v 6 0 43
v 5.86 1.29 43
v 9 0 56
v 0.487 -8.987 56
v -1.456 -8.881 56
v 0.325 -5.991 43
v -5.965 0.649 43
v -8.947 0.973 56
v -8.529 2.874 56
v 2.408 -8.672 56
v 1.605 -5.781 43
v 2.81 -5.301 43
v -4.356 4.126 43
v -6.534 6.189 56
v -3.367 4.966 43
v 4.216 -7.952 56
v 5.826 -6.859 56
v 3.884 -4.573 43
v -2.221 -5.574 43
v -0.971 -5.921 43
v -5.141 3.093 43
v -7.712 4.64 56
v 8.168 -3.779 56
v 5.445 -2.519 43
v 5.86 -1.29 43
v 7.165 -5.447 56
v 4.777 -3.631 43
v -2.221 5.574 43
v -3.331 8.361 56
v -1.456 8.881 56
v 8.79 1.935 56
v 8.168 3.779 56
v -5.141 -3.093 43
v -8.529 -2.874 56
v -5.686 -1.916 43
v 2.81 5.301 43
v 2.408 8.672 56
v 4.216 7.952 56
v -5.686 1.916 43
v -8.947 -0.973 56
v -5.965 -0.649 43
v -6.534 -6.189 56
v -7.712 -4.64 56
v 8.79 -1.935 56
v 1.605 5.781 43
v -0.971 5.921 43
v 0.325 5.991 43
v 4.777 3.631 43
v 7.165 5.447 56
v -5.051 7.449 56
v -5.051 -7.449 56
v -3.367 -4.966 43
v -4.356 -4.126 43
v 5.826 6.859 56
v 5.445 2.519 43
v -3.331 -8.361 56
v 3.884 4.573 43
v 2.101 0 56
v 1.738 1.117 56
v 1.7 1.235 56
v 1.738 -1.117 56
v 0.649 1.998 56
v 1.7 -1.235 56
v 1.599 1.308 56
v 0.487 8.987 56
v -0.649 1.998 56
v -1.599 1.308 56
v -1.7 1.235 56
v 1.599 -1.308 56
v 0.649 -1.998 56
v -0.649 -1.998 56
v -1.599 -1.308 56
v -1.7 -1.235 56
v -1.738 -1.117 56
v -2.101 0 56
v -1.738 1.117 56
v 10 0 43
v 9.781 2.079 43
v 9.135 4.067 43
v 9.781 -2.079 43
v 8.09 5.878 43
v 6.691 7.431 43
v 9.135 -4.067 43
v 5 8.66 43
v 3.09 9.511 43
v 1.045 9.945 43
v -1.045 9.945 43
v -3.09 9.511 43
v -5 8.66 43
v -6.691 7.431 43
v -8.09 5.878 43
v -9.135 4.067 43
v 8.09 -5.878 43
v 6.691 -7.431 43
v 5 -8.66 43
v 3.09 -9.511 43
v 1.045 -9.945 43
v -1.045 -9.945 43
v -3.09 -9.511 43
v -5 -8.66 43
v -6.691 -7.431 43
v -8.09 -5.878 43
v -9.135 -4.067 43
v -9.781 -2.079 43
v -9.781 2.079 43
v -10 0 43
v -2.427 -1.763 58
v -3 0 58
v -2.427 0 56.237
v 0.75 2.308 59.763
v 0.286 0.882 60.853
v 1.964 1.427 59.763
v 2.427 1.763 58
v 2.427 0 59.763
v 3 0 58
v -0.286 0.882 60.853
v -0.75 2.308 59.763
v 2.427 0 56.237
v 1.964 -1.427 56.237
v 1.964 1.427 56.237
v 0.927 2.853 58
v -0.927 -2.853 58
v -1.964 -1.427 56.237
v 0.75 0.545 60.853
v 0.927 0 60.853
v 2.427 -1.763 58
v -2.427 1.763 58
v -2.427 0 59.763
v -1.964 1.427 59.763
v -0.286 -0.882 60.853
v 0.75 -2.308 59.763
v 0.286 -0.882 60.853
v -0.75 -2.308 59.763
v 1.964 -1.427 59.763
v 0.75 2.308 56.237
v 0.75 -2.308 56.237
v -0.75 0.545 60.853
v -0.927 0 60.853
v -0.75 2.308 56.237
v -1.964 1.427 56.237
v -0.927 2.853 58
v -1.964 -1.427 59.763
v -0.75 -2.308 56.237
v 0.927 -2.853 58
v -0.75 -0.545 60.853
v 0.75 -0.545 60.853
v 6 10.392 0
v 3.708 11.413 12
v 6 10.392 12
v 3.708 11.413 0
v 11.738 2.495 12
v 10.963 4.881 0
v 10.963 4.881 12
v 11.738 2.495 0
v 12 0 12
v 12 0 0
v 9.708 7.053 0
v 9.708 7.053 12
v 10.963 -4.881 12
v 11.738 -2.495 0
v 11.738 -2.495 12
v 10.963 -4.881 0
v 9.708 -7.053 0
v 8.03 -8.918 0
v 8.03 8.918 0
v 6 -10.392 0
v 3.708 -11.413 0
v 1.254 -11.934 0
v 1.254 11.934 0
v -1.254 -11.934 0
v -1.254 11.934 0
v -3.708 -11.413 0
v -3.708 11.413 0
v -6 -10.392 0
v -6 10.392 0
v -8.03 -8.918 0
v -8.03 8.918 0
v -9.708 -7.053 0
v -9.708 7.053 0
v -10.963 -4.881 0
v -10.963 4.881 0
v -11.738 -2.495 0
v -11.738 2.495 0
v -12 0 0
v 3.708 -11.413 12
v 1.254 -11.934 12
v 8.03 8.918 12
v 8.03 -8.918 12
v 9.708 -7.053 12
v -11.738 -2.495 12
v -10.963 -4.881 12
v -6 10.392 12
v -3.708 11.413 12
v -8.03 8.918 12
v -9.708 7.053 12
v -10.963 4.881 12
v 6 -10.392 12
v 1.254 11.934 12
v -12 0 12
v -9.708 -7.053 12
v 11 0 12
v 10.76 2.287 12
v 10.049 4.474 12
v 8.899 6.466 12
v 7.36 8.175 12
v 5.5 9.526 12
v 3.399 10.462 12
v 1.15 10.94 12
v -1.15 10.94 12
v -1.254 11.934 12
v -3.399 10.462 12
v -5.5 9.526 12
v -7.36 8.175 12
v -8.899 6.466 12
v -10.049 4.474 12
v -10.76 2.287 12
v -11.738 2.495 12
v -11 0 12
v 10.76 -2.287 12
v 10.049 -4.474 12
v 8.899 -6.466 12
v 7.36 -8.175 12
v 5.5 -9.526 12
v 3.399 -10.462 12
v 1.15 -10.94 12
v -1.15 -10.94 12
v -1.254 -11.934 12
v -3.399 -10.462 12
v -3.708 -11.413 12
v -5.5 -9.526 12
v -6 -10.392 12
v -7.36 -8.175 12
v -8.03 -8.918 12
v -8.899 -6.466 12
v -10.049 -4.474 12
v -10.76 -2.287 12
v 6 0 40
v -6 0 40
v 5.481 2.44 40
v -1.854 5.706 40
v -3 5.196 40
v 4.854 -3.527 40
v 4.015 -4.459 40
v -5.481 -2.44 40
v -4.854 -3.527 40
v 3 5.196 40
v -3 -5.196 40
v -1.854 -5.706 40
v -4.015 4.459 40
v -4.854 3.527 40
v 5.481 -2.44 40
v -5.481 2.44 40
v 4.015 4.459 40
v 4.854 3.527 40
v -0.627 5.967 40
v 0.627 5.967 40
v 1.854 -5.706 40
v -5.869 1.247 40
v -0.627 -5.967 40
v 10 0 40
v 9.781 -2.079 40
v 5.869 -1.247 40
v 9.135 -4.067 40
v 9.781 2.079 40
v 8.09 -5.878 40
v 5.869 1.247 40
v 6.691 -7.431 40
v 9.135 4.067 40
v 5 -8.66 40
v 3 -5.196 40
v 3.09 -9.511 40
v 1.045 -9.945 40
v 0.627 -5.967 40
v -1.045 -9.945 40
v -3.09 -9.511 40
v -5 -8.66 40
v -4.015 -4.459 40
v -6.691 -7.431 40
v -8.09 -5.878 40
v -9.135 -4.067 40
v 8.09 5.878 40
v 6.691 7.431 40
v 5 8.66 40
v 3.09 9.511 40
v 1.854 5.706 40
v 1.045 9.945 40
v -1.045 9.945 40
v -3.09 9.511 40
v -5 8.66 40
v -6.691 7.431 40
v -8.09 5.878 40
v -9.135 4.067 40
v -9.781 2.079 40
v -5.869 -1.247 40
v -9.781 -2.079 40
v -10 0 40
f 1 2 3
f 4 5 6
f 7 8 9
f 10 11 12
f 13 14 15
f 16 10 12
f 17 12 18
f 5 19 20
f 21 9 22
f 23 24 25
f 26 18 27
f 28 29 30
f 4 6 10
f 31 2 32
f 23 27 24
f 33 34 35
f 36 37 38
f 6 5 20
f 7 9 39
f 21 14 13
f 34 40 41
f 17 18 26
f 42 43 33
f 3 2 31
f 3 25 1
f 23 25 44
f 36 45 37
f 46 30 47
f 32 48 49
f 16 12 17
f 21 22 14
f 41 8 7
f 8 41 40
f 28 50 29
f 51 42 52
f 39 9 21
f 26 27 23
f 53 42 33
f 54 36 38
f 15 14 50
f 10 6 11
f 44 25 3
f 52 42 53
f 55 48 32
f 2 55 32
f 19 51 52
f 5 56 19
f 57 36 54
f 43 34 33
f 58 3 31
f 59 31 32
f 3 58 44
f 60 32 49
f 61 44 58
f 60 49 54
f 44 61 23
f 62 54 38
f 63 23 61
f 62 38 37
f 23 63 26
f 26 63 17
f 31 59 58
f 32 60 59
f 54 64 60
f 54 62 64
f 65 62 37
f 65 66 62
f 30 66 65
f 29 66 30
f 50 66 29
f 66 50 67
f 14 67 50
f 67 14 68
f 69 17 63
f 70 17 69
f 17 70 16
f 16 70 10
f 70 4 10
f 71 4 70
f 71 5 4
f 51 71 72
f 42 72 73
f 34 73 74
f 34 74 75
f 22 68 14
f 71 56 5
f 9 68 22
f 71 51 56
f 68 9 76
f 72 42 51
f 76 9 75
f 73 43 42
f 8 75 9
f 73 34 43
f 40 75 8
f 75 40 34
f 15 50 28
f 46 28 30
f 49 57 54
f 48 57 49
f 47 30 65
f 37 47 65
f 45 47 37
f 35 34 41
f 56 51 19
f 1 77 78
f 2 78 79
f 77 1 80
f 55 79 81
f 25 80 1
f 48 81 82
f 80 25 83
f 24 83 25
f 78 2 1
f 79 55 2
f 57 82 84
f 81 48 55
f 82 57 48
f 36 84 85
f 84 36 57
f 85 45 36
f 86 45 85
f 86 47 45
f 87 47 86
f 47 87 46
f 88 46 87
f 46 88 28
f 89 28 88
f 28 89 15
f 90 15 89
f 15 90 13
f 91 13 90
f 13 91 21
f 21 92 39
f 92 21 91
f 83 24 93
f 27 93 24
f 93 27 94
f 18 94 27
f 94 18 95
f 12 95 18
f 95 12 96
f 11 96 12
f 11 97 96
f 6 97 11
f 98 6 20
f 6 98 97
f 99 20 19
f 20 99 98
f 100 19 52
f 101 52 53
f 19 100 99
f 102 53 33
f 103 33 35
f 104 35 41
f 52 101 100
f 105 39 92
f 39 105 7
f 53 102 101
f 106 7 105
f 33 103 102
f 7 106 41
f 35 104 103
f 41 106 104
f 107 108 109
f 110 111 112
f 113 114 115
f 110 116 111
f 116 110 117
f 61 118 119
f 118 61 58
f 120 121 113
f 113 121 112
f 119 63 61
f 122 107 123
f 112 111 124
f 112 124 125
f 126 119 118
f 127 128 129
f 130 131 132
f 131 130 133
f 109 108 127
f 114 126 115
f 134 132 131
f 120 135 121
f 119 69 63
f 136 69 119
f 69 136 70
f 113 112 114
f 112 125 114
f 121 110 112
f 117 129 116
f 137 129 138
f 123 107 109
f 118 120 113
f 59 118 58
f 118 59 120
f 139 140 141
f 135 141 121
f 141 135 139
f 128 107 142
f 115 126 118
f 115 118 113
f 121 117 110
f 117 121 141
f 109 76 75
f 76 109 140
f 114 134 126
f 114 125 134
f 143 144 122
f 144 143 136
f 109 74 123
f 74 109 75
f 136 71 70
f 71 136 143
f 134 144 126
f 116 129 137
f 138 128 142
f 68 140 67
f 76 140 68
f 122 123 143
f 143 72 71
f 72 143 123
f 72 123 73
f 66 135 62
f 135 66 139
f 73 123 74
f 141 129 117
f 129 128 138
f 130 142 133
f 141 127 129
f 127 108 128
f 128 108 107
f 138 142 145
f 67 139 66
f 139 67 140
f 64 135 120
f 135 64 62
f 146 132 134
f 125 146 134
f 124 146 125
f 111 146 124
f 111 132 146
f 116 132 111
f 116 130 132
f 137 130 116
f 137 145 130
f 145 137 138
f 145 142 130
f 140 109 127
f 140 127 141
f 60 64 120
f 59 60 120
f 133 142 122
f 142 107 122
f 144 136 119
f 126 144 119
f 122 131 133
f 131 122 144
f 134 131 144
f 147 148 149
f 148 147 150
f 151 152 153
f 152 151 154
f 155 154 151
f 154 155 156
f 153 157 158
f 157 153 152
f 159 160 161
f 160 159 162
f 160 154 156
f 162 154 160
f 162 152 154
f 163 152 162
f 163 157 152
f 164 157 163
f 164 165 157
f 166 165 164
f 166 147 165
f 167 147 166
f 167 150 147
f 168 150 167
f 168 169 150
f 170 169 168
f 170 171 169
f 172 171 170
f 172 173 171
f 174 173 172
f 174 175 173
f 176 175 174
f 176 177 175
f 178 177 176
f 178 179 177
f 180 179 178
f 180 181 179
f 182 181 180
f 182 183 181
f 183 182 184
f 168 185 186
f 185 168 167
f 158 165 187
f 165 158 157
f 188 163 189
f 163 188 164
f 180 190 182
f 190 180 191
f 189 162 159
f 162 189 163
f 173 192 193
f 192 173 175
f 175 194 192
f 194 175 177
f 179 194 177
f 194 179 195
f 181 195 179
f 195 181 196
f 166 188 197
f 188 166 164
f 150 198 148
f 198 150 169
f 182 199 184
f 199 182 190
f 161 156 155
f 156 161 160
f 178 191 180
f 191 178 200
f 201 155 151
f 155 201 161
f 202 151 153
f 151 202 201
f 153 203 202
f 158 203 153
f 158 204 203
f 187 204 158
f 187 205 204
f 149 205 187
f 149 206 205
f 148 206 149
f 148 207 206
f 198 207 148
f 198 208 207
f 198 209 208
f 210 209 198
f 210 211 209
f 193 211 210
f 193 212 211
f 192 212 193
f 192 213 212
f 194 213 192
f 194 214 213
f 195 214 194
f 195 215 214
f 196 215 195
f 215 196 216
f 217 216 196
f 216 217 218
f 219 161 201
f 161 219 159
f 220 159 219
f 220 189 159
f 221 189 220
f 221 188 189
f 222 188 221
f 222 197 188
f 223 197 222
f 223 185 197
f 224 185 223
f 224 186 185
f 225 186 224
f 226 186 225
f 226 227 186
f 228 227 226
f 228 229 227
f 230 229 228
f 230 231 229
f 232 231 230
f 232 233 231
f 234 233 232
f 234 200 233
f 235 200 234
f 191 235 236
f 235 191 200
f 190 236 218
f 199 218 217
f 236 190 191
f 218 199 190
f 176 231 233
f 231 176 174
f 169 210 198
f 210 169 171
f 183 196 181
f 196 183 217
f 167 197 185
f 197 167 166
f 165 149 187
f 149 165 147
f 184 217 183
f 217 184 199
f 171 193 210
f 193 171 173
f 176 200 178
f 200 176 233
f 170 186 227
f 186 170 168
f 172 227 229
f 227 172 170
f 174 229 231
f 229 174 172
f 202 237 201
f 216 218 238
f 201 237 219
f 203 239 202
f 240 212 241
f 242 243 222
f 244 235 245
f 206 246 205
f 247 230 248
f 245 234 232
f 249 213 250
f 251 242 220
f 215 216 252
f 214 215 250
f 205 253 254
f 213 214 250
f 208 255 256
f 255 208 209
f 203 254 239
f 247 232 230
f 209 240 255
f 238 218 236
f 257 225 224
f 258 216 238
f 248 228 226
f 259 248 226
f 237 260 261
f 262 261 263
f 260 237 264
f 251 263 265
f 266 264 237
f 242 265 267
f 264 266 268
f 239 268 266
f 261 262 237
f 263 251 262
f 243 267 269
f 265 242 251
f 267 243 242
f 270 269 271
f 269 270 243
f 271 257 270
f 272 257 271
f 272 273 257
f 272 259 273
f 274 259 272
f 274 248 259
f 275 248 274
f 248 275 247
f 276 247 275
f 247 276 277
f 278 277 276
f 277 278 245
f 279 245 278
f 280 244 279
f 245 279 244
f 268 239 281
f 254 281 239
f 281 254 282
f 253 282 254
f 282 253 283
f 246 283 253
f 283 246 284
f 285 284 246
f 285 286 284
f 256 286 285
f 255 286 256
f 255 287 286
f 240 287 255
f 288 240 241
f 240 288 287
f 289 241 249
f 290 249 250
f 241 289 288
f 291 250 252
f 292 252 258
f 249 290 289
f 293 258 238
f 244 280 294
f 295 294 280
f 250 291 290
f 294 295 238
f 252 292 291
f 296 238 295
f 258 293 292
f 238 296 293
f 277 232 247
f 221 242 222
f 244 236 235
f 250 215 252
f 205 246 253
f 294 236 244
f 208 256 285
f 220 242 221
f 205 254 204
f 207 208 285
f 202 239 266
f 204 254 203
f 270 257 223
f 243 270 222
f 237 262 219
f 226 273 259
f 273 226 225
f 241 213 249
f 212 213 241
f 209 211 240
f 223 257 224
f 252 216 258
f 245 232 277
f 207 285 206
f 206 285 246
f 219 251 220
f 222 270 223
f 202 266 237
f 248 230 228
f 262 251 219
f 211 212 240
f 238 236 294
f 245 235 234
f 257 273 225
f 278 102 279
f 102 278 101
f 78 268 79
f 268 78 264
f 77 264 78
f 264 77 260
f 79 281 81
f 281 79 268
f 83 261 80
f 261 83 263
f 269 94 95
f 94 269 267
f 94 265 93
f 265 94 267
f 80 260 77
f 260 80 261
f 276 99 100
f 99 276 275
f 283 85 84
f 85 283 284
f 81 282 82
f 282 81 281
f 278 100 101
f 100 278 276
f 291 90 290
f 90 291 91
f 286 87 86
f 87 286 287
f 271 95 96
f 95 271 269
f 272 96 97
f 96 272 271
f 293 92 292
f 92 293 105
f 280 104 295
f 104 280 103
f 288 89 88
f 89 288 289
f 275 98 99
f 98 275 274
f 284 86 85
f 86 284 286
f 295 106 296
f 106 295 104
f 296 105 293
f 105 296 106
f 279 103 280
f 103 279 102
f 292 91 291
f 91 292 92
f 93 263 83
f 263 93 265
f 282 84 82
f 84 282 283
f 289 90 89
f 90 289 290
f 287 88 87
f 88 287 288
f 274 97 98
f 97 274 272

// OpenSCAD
// Generated by SolidPython 1.1.1 on 2021-10-30 23:48:01


union() {
	cylinder(d = 24, h = 12);
	translate(v = [0, 0, 12]) {
		cylinder(d1 = 22, d2 = 12, h = 28);
	}
	translate(v = [0, 0, 40]) {
		cylinder(d = 20, h = 3);
	}
	translate(v = [0, 0, 43]) {
		union() {
			cylinder(d1 = 12, d2 = 18, h = 13);
			translate(v = [0, 0, 15]) {
				sphere(d = 6);
			}
		}
	}
}
/***********************************************
*********      SolidPython code:      **********
************************************************
 
from solid import *
from solid.utils import *

#total height 6.1cm

base = cylinder(d=24, h=12)
body = cylinder(d1=22, d2=12, h=28)
colar = cylinder(d=20, h=3)
head = cylinder(d1=12, d2=18, h=13)
head += up(15)(sphere(d=6))

queen = base + up(12)(body) + up(40)(colar) + up(43)(head)

scad_render_to_file(queen, "./queen.scad") 
 
************************************************/
